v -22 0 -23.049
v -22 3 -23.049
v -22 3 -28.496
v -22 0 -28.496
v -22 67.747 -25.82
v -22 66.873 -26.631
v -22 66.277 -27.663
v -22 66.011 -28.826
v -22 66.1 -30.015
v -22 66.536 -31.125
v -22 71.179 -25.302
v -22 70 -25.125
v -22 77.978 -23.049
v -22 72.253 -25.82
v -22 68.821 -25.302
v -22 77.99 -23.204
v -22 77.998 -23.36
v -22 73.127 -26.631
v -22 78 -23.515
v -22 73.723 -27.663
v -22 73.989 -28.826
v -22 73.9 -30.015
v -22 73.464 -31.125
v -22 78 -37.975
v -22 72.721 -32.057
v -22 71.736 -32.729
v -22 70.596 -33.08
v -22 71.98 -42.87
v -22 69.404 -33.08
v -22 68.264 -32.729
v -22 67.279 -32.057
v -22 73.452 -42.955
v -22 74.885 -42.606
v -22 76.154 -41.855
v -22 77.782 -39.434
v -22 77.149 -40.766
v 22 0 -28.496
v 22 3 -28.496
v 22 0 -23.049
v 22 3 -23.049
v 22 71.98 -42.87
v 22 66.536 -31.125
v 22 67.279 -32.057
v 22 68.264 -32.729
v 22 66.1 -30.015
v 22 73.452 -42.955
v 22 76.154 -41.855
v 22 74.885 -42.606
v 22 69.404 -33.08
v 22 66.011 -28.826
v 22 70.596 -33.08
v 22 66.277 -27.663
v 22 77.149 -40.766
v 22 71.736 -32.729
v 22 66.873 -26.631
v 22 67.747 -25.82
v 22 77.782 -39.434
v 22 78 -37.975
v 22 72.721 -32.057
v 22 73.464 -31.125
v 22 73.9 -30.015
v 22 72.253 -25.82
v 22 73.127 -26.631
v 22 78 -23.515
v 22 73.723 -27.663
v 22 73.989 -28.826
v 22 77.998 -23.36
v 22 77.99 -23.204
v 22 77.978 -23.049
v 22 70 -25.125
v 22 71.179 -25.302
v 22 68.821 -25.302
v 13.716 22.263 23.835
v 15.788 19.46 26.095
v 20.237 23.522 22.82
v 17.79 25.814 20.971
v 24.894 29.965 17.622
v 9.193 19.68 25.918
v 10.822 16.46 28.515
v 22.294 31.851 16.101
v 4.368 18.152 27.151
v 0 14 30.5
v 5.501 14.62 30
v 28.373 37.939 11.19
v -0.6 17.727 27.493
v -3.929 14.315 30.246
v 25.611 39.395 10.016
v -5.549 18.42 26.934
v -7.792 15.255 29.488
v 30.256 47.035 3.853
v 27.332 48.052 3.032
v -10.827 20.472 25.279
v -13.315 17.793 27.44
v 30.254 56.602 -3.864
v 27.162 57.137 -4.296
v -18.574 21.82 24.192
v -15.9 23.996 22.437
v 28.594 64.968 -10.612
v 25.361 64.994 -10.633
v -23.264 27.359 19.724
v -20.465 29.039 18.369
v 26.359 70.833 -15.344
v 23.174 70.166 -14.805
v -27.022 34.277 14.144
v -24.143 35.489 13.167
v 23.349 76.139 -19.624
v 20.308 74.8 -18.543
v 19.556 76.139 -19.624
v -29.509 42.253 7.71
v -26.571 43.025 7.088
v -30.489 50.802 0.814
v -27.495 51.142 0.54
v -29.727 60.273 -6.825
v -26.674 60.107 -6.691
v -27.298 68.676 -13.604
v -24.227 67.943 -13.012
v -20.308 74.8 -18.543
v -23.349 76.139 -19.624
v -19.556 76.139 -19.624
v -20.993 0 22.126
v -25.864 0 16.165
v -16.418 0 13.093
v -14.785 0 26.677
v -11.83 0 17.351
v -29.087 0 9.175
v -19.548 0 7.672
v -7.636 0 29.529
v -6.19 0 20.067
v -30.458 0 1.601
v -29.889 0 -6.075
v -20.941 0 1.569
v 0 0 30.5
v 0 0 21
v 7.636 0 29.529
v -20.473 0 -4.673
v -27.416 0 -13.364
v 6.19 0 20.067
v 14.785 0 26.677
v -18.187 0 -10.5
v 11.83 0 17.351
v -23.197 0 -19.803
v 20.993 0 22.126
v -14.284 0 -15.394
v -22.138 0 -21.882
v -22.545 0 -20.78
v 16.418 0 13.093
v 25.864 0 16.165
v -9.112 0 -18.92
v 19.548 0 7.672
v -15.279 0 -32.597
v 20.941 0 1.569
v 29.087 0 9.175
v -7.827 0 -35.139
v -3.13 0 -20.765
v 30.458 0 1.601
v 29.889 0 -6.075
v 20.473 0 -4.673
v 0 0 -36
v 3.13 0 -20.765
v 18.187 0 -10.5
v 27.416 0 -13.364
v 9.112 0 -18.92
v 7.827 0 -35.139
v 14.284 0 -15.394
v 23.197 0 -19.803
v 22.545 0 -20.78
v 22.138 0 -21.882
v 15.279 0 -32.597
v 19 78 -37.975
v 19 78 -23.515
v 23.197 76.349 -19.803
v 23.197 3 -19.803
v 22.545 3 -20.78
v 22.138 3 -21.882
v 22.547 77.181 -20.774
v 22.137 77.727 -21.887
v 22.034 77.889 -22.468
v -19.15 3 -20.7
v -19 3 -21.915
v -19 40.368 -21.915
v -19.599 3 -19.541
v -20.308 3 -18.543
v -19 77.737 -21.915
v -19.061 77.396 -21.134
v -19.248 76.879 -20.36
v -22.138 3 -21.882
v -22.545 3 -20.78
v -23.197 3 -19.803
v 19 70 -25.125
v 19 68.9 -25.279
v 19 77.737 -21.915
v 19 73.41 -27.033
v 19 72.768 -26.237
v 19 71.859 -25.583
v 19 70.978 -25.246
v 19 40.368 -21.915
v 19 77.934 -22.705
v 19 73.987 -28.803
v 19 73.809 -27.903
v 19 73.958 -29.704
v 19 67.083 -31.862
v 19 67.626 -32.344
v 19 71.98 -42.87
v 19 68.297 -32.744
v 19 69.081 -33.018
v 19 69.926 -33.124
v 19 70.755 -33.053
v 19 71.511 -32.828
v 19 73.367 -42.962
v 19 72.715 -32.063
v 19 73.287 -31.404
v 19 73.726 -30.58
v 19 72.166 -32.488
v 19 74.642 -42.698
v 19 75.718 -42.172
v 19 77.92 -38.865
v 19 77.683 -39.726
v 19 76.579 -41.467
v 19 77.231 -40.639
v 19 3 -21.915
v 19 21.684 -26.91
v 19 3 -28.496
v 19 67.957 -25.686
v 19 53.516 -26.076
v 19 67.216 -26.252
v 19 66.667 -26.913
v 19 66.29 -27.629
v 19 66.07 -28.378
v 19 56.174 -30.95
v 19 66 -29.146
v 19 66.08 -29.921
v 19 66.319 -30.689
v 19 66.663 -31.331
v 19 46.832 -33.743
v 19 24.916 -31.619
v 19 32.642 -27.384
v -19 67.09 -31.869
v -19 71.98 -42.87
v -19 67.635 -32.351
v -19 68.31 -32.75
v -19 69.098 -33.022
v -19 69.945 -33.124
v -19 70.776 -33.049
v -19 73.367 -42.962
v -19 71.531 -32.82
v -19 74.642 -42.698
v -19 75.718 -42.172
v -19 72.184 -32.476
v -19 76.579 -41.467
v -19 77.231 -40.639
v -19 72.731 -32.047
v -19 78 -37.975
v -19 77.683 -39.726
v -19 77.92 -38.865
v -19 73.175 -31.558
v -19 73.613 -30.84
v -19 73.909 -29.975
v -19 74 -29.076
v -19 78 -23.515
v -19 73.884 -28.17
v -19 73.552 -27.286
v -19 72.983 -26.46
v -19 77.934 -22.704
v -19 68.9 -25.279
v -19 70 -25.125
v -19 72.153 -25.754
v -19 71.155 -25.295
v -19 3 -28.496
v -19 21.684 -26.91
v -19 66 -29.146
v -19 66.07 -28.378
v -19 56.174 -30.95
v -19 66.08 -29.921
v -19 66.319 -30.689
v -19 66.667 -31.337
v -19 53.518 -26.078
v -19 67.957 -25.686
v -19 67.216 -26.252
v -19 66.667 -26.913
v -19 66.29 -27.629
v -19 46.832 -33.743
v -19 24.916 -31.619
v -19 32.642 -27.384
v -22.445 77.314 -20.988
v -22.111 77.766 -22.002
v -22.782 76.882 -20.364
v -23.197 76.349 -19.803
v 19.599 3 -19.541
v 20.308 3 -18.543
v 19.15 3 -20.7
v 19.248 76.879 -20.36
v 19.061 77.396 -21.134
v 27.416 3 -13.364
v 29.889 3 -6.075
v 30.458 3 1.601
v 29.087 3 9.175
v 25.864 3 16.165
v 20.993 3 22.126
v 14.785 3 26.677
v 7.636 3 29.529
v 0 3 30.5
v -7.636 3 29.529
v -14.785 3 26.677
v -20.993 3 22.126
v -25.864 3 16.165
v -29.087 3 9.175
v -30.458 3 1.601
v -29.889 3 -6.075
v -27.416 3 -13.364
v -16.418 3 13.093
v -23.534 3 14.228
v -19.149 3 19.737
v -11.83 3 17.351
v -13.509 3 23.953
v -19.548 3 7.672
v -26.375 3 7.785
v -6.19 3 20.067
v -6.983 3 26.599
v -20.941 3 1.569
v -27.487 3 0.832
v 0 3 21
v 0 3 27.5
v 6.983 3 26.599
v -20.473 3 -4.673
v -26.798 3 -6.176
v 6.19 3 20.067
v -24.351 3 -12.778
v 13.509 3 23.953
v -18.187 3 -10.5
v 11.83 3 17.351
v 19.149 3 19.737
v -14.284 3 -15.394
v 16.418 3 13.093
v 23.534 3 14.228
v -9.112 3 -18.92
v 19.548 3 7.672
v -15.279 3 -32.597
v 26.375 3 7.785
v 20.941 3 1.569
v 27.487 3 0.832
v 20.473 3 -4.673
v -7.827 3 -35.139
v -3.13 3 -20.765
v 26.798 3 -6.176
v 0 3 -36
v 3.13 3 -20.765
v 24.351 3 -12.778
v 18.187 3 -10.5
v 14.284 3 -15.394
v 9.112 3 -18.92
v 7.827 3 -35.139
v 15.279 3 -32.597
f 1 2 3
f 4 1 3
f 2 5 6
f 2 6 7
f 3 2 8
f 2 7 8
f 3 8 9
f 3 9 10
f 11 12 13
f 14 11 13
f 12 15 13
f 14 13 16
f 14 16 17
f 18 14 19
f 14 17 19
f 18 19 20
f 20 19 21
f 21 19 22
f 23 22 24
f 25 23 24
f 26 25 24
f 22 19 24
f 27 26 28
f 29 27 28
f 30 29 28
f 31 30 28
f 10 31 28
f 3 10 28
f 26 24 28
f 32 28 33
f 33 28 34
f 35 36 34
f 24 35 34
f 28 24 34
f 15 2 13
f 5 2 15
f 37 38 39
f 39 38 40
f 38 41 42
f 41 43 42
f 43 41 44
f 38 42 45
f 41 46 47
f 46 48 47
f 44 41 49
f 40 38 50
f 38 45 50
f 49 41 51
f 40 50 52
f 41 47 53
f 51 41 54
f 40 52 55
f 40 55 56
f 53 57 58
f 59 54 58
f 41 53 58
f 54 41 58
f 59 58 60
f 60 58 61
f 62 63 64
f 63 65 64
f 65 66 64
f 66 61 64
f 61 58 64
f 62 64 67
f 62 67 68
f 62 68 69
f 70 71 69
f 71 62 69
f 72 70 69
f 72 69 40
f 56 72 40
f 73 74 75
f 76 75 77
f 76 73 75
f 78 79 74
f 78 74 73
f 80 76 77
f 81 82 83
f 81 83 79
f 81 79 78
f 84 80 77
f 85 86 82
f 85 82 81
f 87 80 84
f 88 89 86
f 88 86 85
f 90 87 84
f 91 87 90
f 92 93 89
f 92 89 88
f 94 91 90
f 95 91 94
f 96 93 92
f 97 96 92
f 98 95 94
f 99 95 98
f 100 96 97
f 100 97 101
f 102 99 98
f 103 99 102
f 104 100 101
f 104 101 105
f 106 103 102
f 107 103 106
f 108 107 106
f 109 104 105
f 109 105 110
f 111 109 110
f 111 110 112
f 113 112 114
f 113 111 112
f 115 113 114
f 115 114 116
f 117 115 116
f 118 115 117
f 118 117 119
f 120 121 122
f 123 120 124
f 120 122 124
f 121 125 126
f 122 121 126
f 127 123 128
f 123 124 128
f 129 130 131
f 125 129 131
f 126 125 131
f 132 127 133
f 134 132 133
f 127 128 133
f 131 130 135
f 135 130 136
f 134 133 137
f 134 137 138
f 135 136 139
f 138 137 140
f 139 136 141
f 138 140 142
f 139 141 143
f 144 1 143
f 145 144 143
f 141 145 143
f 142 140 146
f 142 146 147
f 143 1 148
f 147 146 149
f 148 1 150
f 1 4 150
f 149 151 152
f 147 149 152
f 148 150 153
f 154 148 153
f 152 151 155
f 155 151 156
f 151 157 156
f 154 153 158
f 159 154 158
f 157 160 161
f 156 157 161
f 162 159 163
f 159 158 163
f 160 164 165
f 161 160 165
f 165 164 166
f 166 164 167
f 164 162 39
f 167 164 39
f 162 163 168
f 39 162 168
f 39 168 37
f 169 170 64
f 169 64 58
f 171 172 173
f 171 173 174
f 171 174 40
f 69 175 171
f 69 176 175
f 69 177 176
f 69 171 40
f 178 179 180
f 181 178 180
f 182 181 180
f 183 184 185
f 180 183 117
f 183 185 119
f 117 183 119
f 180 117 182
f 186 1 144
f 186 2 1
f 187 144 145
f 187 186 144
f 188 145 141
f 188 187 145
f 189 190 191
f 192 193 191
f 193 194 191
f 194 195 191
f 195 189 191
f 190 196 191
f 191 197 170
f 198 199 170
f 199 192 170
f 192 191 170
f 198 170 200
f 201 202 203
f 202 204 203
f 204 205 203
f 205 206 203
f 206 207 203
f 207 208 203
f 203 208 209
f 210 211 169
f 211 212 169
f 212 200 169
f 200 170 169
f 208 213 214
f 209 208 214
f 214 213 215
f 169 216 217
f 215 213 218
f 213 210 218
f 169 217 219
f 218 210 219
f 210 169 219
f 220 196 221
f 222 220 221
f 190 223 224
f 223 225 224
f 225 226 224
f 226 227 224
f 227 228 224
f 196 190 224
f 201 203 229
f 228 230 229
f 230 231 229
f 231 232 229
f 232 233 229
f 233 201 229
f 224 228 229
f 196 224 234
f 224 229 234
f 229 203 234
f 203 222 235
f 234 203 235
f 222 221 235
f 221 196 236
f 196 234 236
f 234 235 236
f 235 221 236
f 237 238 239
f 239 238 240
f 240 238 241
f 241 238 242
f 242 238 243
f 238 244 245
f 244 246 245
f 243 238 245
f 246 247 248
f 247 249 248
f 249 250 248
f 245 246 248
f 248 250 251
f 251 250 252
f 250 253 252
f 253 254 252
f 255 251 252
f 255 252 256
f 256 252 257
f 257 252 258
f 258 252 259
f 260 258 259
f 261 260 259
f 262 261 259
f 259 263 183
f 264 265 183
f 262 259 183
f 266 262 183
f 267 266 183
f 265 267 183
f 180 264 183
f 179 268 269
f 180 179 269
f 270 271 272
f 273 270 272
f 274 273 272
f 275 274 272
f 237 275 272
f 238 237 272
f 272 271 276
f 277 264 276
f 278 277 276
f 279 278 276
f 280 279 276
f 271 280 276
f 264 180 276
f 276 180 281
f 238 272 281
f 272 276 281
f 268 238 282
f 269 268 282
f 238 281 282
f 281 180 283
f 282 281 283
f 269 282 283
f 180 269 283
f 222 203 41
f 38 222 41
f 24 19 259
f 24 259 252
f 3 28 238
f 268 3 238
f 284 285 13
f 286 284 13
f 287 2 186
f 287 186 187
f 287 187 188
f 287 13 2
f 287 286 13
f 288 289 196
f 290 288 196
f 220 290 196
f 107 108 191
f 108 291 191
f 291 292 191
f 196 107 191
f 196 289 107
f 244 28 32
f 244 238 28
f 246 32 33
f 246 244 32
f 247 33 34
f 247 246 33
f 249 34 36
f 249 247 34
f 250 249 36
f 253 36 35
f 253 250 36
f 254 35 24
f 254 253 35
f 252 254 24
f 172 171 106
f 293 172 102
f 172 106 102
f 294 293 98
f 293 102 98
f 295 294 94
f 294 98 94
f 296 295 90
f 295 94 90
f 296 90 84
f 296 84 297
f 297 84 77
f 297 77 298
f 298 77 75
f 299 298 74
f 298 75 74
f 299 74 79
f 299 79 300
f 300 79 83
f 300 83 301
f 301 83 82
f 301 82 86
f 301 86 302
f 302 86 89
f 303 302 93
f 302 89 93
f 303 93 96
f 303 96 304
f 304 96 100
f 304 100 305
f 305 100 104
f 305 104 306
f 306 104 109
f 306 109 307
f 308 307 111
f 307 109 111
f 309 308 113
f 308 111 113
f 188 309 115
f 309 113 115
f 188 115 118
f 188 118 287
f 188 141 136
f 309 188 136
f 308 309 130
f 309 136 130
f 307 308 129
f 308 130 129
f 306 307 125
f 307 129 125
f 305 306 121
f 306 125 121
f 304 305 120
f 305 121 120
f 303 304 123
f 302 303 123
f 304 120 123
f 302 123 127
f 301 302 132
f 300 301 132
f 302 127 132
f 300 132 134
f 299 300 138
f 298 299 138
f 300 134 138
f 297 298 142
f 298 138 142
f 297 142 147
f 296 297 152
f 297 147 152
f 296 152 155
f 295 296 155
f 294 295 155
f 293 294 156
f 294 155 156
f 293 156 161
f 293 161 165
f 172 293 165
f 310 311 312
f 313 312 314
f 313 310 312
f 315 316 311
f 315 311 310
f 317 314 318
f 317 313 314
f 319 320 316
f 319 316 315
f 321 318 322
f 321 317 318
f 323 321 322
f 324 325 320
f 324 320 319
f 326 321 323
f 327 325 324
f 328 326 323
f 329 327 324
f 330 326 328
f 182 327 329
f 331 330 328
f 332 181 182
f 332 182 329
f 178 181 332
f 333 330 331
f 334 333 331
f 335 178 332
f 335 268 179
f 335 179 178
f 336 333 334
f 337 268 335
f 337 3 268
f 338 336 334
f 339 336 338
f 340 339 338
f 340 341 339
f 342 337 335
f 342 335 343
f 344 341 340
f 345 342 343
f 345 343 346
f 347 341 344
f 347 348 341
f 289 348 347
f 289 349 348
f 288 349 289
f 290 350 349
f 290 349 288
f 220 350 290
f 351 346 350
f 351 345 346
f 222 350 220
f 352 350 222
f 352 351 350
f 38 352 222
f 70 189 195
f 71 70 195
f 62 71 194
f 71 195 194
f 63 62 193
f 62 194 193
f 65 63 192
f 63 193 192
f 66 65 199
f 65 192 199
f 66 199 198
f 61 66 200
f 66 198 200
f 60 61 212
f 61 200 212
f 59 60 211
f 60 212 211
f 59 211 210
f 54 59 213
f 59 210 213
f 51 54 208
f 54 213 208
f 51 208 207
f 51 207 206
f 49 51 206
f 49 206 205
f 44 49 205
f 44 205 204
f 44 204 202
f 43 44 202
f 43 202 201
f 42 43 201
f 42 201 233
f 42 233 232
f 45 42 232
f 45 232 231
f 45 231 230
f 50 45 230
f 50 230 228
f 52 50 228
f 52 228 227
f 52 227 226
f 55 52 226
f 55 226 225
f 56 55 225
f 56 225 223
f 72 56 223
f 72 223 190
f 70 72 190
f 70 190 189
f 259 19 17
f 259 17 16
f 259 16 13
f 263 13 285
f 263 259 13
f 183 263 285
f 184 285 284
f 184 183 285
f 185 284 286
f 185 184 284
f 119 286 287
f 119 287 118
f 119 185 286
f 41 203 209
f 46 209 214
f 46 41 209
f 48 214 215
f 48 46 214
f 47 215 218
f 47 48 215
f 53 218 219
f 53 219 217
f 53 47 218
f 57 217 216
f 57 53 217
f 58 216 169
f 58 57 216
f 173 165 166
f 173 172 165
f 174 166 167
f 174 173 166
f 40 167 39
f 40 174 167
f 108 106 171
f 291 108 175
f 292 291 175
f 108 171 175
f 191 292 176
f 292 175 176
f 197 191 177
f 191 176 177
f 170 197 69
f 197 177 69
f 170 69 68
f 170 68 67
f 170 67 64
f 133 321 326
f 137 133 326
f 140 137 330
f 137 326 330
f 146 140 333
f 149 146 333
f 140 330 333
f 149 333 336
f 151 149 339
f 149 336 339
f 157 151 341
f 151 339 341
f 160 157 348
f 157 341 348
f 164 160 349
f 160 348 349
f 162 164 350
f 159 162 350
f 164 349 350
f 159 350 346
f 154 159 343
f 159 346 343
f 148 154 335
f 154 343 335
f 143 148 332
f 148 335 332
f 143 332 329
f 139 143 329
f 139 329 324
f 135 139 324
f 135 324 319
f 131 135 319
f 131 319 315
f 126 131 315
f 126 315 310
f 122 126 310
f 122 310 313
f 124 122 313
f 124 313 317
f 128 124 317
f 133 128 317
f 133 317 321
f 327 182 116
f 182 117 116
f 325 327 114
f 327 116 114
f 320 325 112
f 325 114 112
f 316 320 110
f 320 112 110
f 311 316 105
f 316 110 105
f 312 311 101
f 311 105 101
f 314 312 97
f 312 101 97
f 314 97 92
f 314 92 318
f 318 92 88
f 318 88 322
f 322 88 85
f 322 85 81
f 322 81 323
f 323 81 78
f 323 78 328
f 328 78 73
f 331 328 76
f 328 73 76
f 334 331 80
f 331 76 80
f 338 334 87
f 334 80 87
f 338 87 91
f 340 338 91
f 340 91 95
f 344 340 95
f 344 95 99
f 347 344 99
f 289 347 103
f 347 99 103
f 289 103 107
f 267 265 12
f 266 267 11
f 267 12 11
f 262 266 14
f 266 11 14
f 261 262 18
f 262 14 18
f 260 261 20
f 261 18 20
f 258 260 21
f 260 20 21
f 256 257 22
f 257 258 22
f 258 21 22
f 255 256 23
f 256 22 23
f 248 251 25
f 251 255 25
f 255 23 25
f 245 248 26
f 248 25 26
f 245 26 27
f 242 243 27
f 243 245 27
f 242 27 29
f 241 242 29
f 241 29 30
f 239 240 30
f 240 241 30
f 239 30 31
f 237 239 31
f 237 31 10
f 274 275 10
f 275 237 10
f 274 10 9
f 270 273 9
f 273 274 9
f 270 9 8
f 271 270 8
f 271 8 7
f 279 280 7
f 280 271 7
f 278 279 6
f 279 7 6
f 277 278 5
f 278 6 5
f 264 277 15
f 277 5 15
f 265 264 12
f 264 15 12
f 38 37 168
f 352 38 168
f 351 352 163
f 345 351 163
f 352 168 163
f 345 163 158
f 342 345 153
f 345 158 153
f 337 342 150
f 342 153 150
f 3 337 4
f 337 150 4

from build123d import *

# Parameters (mm, degrees)
SKETCH1_R               = 30.5
BOSS_EXTRUDE1_DEPTH     = 3
CUT_EXTRUDE1_DEPTH      = 95.663789341
CUT_EXTRUDE1_DEPTH_BACK = 95.663789341
SKETCH10_R              = 4
CUT_EXTRUDE2_DEPTH      = 104.861605143
SKETCH11_R              = 21
CUT_EXTRUDE3_DEPTH      = 93.207554018
FILLET1_R               = 5
FILLET2_R               = 5
FILLET3_R               = 5


with BuildPart() as part:
    # Sketch1 → Boss-Extrude1 (new body)
    with BuildSketch(Plane(origin=(0, 0, 0), x_dir=(1, 0, 0), z_dir=(0, 1, 0))):
        Circle(SKETCH1_R)
        with BuildLine():
            Line((22, 21.124630174), (22, 28.495613698))
            ThreePointArc((22, 28.495613698), (0, 36), (-22, 28.495613698))
            Line((-22, 28.495613698), (-22, 21.124630174))
            ThreePointArc((-22, 21.124630174), (0, 30.5), (22, 21.124630174))
        make_face()
    extrude(amount=BOSS_EXTRUDE1_DEPTH)

    # Sketch2 → Loft1 section 0
    with BuildSketch(Plane(origin=(0, 3, 0), x_dir=(1, 0, 0), z_dir=(0, 1, 0))):
        with BuildLine():
            Line((-22, 21.124630174), (-22, 28.495613698))
            Line((-22, 28.495613698), (-19, 28.495613698))
            Line((-19, 28.495613698), (-19, 19.880895352))
            ThreePointArc((-19, 19.880895352), (0, -27.5), (19, 19.880895352))
            Line((19, 19.880895352), (19, 28.495613698))
            Line((19, 28.495613698), (22, 28.495613698))
            Line((22, 28.495613698), (22, 21.124630174))
            ThreePointArc((22, 21.124630174), (0, -30.5), (-22, 21.124630174))
        make_face()
    # Sketch3 → Loft1 section 1
    with BuildSketch(Plane(origin=(0, 78, 0), x_dir=(1, 0, 0), z_dir=(0, 1, 0))):
        with BuildLine():
            Line((-22, 21.124630174), (-22, 44.124630174))
            Line((-22, 44.124630174), (-19, 44.124630174))
            Line((-19, 44.124630174), (-19, 19.880895352))
            ThreePointArc((-19, 19.880895352), (0, -27.5), (19, 19.880895352))
            Line((19, 19.880895352), (19, 44.124630174))
            Line((19, 44.124630174), (22, 44.124630174))
            Line((22, 44.124630174), (22, 21.124630174))
            ThreePointArc((22, 21.124630174), (0, -30.5), (-22, 21.124630174))
        make_face()
    loft()

    # Sketch9 → Cut-Extrude1 (cut, two sides: drawn at the far end of the back side and taken through both)
    with BuildSketch(Plane(origin=(0, 0, 0), x_dir=(0, 0, -1), z_dir=(1, 0, 0)).offset(-CUT_EXTRUDE1_DEPTH_BACK)):
        Polygon((-30.5, 14), (21.124630174, 78), (-30.5, 78), align=None)
    extrude(amount=CUT_EXTRUDE1_DEPTH + CUT_EXTRUDE1_DEPTH_BACK, mode=Mode.SUBTRACT)

    # Sketch10 → Cut-Extrude2 (cut, through all)
    with BuildSketch(Plane.ZY.offset(22)):
        with Locations((-29.124630174, 70)):
            Circle(SKETCH10_R)
    extrude(amount=-CUT_EXTRUDE2_DEPTH, mode=Mode.SUBTRACT)

    # Sketch11 → Cut-Extrude3 (cut, through all)
    with BuildSketch(Plane(origin=(0, 3, 0), x_dir=(1, 0, 0), z_dir=(0, 1, 0))):
        with Locations(Location((0, 0, 0), (0, 0, 270))):
            Circle(SKETCH11_R)
    extrude(amount=-CUT_EXTRUDE3_DEPTH, mode=Mode.SUBTRACT)

    # Fillet1
    fillet1_edges = [part.edges().sort_by_distance(p)[0] for p in [
        (-20.5, 78, -44.124630174),
        (20.5, 78, -44.124630174),
    ]]
    fillet(fillet1_edges, radius=FILLET1_R)

    # Fillet2
    fillet2_edges = [part.edges().sort_by_distance(p)[0] for p in [
        (-20.5, 78, -21.124630174),
        (20.5, 78, -21.124630174),
    ]]
    fillet(fillet2_edges, radius=FILLET2_R)

    # Fillet3
    fillet3_edges = [part.edges().sort_by_distance(p)[0] for p in [
        (19, 39.716879031, -19.880895352),
        (-19, 39.716879031, -19.880895352),
        (22, 38.695702002, -21.124630174),
        (-22, 38.695702002, -21.124630174),
    ]]
    fillet(fillet3_edges, radius=FILLET3_R)


solid = part.part
